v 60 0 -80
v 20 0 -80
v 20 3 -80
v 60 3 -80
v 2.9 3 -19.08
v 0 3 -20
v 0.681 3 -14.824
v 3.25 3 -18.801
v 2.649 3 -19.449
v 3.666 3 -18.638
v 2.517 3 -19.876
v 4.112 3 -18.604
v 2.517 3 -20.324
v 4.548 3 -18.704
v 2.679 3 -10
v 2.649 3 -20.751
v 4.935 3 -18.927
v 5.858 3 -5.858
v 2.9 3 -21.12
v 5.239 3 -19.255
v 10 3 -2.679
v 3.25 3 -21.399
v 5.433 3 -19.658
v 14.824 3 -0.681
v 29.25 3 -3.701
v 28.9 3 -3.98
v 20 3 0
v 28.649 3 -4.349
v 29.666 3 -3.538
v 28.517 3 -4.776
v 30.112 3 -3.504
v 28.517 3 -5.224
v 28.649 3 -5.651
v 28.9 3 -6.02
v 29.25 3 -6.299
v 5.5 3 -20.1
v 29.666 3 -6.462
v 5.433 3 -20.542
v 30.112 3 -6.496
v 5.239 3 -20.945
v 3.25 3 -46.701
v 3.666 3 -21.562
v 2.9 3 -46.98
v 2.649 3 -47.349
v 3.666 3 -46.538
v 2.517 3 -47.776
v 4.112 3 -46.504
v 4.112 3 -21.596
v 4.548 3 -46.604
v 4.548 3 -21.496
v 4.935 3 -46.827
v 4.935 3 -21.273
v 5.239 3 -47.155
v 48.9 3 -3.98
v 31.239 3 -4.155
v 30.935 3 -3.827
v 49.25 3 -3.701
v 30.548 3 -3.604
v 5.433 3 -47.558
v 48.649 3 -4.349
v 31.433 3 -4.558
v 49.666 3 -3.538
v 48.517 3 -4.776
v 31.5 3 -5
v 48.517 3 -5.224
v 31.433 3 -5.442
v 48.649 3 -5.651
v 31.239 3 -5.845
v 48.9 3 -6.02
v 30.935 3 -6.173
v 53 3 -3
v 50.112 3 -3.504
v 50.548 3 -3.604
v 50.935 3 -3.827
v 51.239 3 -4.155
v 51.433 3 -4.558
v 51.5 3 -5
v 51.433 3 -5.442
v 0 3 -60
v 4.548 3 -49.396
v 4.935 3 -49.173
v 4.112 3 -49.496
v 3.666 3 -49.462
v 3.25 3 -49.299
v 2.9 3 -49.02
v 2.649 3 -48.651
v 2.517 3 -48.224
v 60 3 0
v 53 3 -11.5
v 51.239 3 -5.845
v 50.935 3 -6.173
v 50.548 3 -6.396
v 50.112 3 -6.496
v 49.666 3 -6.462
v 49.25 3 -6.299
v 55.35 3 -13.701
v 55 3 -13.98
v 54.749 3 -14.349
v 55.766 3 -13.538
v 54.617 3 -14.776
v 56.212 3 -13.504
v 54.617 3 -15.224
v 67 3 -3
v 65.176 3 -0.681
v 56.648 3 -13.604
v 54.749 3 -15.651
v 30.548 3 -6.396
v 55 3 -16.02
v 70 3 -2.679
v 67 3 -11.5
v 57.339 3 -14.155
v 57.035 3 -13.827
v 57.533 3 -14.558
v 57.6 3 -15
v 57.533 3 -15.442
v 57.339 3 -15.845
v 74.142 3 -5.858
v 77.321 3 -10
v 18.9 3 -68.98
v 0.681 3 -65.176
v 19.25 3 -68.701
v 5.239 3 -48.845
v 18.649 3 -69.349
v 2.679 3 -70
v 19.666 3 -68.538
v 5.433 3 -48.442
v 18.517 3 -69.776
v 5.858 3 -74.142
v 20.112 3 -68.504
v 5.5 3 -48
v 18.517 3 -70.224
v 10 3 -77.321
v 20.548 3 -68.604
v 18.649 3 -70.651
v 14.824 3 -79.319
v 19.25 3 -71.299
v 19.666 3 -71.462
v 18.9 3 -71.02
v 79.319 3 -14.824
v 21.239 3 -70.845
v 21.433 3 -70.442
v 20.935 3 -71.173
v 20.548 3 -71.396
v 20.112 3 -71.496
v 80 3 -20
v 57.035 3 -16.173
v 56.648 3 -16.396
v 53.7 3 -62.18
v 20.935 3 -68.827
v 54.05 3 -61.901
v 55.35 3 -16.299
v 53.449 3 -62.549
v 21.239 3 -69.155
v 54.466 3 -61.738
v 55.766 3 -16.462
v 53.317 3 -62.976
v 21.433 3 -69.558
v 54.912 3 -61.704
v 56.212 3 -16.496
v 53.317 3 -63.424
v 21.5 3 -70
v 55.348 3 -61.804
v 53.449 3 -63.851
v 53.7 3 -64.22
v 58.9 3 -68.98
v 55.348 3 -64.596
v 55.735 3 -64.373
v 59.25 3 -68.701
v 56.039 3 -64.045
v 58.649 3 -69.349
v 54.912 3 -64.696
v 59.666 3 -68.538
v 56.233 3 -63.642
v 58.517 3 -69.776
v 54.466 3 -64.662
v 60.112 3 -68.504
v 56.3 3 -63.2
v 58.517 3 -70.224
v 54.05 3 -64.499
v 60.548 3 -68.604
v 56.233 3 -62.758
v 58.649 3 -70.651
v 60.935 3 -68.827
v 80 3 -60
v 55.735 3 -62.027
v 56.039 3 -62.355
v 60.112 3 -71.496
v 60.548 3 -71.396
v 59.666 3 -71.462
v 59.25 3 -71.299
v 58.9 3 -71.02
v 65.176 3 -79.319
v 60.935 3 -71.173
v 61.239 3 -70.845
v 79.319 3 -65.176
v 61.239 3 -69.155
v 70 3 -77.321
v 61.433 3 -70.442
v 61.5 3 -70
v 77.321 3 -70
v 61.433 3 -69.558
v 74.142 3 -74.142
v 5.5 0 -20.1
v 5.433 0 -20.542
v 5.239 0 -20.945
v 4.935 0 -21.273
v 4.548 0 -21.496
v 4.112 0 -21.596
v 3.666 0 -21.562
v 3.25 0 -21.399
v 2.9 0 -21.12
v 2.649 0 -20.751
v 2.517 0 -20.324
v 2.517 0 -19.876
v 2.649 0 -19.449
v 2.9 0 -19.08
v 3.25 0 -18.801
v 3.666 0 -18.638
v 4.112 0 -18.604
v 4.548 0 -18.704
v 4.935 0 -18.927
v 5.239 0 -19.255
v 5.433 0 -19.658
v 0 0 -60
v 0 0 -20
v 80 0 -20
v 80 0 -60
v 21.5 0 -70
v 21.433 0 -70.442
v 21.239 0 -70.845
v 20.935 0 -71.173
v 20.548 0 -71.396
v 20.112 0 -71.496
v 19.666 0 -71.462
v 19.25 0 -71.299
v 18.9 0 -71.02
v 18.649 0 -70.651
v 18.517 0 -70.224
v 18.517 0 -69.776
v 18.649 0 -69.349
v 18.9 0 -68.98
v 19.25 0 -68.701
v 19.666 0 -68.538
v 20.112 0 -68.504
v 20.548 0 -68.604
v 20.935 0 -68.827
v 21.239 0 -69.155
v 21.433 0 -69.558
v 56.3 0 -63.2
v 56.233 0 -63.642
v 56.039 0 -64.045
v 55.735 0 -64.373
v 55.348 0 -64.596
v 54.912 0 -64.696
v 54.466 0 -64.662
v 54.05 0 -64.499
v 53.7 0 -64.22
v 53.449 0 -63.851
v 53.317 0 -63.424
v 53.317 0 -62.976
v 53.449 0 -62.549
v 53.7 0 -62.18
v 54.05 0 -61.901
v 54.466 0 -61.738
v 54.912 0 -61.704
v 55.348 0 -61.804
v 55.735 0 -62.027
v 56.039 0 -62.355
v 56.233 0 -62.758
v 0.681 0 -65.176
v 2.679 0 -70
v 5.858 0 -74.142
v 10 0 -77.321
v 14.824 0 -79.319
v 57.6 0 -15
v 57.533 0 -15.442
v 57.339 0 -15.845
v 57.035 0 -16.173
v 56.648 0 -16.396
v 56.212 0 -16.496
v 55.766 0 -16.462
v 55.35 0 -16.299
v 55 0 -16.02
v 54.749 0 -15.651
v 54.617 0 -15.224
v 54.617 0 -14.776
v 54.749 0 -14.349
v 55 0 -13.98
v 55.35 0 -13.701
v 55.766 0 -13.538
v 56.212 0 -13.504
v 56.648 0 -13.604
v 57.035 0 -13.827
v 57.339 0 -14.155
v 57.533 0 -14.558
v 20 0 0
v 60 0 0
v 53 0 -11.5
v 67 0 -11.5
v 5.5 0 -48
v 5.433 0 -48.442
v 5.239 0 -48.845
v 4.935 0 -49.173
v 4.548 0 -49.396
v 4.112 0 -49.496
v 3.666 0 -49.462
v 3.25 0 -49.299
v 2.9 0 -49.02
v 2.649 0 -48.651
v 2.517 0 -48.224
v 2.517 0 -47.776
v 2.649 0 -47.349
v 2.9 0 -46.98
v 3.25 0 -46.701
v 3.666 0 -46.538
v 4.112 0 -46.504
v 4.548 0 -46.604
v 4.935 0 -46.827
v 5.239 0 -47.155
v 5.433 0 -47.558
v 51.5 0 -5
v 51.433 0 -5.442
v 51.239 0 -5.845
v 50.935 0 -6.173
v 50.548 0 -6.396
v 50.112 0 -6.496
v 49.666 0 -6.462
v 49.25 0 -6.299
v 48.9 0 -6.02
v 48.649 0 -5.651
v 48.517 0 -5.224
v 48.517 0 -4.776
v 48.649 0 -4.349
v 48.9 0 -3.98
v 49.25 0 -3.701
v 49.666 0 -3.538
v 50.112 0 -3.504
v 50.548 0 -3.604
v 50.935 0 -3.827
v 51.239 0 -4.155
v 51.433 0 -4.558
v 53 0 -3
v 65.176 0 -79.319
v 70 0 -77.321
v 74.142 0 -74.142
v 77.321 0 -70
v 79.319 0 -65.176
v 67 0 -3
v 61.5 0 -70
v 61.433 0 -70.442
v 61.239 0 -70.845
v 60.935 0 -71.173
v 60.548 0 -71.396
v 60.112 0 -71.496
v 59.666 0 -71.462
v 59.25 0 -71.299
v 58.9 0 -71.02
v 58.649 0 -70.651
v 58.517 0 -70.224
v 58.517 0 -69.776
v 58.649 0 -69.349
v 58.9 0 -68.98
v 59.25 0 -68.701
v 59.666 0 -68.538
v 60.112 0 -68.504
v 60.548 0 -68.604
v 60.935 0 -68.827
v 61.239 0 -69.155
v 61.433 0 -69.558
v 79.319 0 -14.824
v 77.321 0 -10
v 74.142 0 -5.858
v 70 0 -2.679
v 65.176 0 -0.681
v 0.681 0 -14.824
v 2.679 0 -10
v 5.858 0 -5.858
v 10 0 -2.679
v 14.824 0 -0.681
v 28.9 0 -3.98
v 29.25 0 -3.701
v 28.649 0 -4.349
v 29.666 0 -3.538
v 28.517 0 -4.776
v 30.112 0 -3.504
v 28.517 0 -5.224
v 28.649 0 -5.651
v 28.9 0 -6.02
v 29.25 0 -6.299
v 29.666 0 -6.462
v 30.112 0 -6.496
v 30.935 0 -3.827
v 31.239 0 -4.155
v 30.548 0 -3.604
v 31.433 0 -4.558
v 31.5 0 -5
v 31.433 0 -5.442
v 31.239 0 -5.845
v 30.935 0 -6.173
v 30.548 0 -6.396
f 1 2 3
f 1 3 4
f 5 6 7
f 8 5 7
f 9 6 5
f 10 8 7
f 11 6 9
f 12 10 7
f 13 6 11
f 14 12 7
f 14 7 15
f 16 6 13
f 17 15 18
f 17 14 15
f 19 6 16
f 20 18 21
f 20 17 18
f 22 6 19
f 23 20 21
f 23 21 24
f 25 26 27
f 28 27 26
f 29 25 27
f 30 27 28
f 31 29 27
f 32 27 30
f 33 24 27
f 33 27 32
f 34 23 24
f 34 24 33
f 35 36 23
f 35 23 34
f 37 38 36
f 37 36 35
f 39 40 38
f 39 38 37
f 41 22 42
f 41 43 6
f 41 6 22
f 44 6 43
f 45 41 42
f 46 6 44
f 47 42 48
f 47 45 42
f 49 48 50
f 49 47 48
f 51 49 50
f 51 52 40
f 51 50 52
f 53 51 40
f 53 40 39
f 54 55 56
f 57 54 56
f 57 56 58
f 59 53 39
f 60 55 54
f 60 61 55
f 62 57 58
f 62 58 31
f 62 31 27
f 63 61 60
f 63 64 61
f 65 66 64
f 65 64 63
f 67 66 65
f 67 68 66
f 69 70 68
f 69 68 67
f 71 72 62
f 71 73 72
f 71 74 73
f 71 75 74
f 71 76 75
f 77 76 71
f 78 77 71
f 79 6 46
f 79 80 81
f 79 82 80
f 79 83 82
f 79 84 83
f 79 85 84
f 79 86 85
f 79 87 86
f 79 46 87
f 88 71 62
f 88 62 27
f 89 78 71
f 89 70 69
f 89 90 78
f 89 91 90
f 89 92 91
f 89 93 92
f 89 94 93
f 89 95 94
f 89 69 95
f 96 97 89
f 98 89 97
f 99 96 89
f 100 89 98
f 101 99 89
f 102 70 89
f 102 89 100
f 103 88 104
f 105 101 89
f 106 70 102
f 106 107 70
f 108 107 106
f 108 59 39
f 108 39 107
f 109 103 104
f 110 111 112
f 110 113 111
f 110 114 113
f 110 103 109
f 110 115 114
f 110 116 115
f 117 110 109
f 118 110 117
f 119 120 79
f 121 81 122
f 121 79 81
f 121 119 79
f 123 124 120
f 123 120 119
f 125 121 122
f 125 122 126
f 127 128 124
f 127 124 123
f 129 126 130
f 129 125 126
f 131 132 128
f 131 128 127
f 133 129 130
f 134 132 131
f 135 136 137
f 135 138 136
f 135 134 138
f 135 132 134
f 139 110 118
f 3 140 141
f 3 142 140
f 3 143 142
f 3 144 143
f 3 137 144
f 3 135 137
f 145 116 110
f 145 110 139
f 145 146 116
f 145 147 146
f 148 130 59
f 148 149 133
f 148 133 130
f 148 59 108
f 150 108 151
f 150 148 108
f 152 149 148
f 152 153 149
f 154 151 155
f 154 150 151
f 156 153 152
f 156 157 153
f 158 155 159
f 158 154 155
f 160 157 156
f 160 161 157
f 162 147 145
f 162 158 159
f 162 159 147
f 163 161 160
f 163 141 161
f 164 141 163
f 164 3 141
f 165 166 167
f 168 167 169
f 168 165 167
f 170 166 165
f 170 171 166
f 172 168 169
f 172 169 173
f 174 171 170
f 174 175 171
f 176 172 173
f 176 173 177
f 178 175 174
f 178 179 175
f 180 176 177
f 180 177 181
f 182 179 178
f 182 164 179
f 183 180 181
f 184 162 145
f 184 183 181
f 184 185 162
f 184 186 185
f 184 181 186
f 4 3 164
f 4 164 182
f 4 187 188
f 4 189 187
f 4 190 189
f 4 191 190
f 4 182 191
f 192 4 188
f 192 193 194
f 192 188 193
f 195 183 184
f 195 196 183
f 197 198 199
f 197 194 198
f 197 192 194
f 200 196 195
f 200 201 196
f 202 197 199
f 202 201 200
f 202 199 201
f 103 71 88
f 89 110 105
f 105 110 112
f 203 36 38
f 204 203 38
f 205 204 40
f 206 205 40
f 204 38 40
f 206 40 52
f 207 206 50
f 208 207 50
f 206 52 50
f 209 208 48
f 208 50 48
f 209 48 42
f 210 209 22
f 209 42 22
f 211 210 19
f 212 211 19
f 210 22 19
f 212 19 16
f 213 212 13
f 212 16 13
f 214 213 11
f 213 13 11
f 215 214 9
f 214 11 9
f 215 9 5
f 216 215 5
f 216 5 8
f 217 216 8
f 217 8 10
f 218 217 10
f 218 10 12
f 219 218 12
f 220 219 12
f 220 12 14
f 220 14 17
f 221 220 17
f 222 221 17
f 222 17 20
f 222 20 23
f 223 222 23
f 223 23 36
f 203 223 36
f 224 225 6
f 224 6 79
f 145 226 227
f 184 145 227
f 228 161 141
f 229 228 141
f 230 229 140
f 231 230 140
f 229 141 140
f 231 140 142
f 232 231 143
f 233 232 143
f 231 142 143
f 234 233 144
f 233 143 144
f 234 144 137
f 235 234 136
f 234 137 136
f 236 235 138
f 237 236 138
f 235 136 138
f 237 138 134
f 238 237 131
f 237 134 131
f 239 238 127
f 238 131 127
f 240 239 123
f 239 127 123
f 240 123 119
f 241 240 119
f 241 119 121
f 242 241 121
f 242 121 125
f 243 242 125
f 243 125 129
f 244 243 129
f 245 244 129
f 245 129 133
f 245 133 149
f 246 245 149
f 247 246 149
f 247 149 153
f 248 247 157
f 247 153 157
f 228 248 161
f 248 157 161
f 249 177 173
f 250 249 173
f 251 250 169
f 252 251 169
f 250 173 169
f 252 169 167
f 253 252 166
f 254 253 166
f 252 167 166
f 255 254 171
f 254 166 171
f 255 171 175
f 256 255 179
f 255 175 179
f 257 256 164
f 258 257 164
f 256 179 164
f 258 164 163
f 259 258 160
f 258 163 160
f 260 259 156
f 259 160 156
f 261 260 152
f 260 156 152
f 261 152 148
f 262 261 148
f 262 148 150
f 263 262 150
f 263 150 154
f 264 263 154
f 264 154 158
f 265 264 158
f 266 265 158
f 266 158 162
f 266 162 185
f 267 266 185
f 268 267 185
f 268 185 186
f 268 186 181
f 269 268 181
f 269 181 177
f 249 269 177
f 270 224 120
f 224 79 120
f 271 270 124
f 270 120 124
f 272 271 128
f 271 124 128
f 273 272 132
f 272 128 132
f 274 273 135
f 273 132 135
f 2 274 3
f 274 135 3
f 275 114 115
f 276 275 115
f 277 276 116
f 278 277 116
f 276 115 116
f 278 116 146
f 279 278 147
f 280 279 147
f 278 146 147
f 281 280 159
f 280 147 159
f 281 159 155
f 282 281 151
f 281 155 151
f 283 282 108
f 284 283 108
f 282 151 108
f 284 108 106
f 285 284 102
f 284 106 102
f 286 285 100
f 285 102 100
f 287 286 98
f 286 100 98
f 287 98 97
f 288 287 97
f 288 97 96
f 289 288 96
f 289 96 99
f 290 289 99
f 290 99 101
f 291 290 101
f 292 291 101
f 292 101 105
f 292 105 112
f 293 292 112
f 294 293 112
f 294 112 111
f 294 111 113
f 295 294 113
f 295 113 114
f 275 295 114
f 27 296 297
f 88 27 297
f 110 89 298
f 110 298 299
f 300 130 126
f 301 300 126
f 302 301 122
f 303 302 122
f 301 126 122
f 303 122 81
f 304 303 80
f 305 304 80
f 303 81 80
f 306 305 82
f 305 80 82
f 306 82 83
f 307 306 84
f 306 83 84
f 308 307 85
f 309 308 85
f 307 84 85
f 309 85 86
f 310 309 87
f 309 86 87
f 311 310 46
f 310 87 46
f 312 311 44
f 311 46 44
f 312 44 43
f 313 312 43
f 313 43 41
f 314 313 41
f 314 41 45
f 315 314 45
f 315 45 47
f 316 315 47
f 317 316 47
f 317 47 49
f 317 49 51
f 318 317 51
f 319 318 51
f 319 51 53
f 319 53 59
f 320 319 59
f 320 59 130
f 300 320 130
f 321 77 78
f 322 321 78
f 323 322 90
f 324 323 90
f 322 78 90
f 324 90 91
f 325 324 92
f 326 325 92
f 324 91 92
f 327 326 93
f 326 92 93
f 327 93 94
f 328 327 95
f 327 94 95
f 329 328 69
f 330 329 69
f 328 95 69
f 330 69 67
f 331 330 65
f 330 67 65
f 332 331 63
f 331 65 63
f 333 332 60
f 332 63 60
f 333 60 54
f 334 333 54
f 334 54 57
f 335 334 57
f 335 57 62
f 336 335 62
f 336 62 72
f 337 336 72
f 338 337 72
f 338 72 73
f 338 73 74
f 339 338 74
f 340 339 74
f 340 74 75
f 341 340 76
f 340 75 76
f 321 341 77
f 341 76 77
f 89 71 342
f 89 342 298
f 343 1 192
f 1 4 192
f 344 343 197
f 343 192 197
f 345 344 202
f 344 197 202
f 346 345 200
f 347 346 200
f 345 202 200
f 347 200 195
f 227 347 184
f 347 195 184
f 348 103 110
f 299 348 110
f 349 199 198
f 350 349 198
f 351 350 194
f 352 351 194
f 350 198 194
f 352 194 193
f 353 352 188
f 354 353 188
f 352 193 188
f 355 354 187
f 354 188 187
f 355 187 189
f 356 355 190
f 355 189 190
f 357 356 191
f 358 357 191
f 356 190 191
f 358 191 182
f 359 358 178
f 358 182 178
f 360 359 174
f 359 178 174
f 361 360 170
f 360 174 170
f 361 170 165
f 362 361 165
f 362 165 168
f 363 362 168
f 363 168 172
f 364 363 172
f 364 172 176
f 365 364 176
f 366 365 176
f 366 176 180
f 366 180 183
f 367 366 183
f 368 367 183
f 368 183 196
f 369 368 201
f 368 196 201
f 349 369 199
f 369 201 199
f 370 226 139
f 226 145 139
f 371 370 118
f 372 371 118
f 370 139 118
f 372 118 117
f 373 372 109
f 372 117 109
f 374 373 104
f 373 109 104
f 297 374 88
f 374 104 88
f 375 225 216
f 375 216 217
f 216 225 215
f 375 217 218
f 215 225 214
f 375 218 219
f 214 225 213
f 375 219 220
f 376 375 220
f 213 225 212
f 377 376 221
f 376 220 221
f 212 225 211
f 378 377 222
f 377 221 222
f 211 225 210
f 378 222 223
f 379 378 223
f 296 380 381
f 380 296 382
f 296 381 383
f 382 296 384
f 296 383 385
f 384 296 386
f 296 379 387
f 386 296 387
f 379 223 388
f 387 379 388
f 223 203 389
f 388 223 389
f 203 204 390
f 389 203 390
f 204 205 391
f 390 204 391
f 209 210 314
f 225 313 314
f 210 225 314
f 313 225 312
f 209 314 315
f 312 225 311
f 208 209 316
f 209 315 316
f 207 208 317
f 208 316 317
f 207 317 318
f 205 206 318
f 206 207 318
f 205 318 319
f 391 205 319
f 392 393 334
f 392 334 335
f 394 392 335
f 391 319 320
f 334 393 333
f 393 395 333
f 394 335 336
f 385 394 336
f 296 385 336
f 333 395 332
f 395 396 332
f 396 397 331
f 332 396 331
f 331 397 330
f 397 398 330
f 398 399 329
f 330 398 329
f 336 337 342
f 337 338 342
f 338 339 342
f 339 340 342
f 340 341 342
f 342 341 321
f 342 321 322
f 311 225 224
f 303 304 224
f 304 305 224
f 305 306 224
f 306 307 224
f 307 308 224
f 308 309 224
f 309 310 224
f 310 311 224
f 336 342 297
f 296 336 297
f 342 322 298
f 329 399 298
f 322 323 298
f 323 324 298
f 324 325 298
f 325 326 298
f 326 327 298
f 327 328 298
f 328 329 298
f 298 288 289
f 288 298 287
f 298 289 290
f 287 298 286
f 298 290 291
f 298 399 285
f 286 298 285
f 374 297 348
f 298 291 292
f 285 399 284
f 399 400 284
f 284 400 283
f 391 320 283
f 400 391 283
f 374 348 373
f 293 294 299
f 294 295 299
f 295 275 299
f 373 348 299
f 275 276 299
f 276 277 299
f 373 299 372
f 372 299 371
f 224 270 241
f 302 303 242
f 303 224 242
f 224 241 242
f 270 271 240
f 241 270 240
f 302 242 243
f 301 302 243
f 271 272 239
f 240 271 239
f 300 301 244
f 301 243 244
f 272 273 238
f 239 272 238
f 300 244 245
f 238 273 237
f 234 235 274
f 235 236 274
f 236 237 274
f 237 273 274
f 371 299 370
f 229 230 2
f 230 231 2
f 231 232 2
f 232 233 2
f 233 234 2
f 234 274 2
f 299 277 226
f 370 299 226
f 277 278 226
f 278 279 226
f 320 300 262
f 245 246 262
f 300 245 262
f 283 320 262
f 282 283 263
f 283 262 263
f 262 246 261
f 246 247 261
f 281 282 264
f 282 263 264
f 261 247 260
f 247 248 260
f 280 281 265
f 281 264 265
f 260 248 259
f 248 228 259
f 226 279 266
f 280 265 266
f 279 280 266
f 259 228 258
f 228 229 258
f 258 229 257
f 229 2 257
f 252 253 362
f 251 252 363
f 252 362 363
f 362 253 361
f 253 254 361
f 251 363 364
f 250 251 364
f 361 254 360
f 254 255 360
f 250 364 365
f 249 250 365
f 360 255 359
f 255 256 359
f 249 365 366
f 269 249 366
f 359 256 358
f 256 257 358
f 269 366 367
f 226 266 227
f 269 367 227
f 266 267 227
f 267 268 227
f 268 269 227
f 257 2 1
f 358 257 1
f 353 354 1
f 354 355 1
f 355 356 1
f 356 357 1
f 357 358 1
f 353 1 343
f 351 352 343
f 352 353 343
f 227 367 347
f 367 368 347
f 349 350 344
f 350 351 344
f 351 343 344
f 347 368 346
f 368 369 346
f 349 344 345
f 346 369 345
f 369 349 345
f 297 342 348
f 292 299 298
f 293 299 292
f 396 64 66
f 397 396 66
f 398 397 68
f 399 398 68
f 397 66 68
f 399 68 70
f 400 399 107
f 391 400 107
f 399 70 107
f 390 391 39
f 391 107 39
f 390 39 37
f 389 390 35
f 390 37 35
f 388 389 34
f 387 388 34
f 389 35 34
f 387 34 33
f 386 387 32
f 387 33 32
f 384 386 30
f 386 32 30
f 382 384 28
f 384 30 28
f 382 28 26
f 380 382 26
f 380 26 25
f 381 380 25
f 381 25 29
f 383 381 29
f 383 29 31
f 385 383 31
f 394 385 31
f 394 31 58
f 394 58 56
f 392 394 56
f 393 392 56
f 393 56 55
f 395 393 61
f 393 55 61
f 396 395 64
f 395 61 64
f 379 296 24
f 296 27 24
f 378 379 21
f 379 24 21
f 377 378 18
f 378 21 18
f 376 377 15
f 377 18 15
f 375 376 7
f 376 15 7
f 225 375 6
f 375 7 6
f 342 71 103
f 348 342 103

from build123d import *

# Parameters (mm, degrees)
SKETCH3_W           = 80
SKETCH3_H           = 80
BOSS_EXTRUDE1_DEPTH = 3
FILLET3_R           = 20
FILLET4_R           = 20
FILLET5_R           = 20
FILLET6_R           = 20
SKETCH12_R          = 1.5
CUT_EXTRUDE6_DEPTH  = 3
SKETCH13_R          = 1.5
CUT_EXTRUDE7_DEPTH  = 3
SKETCH14_R          = 1.5
CUT_EXTRUDE8_DEPTH  = 10
SKETCH15_W          = 14
SKETCH15_H          = 8.5
CUT_EXTRUDE9_DEPTH  = 10


with BuildPart() as part:
    # Sketch3 → Boss-Extrude1 (new body)
    with BuildSketch(Plane(origin=(0, 0, 0), x_dir=(1, 0, 0), z_dir=(0, 1, 0))):
        with Locations((40, 40)):
            Rectangle(SKETCH3_W, SKETCH3_H)
    extrude(amount=BOSS_EXTRUDE1_DEPTH)

    # Fillet3
    fillet3_edges = [part.edges().sort_by_distance(p)[0] for p in [
        (0, 1.5, -80),
    ]]
    fillet(fillet3_edges, radius=FILLET3_R)

    # Fillet4
    fillet4_edges = [part.edges().sort_by_distance(p)[0] for p in [
        (80, 1.5, -80),
    ]]
    fillet(fillet4_edges, radius=FILLET4_R)

    # Fillet5
    fillet5_edges = [part.edges().sort_by_distance(p)[0] for p in [
        (80, 1.5, 0),
    ]]
    fillet(fillet5_edges, radius=FILLET5_R)

    # Fillet6
    fillet6_edges = [part.edges().sort_by_distance(p)[0] for p in [
        (0, 1.5, 0),
    ]]
    fillet(fillet6_edges, radius=FILLET6_R)

    # Sketch12 → Cut-Extrude6 (cut)
    with BuildSketch(Plane(origin=(0, 3, 0), x_dir=(1, 0, 0), z_dir=(0, 1, 0))):
        with Locations((30, 5)):
            Circle(SKETCH12_R)
        with Locations((50, 5)):
            Circle(SKETCH12_R)
    extrude(amount=-CUT_EXTRUDE6_DEPTH, mode=Mode.SUBTRACT)

    # Sketch13 → Cut-Extrude7 (cut)
    with BuildSketch(Plane(origin=(0, 3, 0), x_dir=(1, 0, 0), z_dir=(0, 1, 0))):
        with Locations((20, 70)):
            Circle(SKETCH13_R)
        with Locations((60, 70)):
            Circle(SKETCH13_R)
    extrude(amount=-CUT_EXTRUDE7_DEPTH, mode=Mode.SUBTRACT)

    # Sketch14 → Cut-Extrude8 (cut)
    with BuildSketch(Plane(origin=(0, 3, 0), x_dir=(1, 0, 0), z_dir=(0, 1, 0))):
        with Locations((4, 20.1)):
            Circle(SKETCH14_R)
        with Locations((4, 48)):
            Circle(SKETCH14_R)
        with Locations((54.8, 63.2)):
            Circle(SKETCH14_R)
        with Locations((56.1, 15)):
            Circle(SKETCH14_R)
    extrude(amount=-CUT_EXTRUDE8_DEPTH, mode=Mode.SUBTRACT)

    # Sketch15 → Cut-Extrude9 (cut)
    with BuildSketch(Plane(origin=(0, 3, 0), x_dir=(1, 0, 0), z_dir=(0, 1, 0))):
        with Locations((60, 7.25)):
            Rectangle(SKETCH15_W, SKETCH15_H)
    extrude(amount=-CUT_EXTRUDE9_DEPTH, mode=Mode.SUBTRACT)


solid = part.part
